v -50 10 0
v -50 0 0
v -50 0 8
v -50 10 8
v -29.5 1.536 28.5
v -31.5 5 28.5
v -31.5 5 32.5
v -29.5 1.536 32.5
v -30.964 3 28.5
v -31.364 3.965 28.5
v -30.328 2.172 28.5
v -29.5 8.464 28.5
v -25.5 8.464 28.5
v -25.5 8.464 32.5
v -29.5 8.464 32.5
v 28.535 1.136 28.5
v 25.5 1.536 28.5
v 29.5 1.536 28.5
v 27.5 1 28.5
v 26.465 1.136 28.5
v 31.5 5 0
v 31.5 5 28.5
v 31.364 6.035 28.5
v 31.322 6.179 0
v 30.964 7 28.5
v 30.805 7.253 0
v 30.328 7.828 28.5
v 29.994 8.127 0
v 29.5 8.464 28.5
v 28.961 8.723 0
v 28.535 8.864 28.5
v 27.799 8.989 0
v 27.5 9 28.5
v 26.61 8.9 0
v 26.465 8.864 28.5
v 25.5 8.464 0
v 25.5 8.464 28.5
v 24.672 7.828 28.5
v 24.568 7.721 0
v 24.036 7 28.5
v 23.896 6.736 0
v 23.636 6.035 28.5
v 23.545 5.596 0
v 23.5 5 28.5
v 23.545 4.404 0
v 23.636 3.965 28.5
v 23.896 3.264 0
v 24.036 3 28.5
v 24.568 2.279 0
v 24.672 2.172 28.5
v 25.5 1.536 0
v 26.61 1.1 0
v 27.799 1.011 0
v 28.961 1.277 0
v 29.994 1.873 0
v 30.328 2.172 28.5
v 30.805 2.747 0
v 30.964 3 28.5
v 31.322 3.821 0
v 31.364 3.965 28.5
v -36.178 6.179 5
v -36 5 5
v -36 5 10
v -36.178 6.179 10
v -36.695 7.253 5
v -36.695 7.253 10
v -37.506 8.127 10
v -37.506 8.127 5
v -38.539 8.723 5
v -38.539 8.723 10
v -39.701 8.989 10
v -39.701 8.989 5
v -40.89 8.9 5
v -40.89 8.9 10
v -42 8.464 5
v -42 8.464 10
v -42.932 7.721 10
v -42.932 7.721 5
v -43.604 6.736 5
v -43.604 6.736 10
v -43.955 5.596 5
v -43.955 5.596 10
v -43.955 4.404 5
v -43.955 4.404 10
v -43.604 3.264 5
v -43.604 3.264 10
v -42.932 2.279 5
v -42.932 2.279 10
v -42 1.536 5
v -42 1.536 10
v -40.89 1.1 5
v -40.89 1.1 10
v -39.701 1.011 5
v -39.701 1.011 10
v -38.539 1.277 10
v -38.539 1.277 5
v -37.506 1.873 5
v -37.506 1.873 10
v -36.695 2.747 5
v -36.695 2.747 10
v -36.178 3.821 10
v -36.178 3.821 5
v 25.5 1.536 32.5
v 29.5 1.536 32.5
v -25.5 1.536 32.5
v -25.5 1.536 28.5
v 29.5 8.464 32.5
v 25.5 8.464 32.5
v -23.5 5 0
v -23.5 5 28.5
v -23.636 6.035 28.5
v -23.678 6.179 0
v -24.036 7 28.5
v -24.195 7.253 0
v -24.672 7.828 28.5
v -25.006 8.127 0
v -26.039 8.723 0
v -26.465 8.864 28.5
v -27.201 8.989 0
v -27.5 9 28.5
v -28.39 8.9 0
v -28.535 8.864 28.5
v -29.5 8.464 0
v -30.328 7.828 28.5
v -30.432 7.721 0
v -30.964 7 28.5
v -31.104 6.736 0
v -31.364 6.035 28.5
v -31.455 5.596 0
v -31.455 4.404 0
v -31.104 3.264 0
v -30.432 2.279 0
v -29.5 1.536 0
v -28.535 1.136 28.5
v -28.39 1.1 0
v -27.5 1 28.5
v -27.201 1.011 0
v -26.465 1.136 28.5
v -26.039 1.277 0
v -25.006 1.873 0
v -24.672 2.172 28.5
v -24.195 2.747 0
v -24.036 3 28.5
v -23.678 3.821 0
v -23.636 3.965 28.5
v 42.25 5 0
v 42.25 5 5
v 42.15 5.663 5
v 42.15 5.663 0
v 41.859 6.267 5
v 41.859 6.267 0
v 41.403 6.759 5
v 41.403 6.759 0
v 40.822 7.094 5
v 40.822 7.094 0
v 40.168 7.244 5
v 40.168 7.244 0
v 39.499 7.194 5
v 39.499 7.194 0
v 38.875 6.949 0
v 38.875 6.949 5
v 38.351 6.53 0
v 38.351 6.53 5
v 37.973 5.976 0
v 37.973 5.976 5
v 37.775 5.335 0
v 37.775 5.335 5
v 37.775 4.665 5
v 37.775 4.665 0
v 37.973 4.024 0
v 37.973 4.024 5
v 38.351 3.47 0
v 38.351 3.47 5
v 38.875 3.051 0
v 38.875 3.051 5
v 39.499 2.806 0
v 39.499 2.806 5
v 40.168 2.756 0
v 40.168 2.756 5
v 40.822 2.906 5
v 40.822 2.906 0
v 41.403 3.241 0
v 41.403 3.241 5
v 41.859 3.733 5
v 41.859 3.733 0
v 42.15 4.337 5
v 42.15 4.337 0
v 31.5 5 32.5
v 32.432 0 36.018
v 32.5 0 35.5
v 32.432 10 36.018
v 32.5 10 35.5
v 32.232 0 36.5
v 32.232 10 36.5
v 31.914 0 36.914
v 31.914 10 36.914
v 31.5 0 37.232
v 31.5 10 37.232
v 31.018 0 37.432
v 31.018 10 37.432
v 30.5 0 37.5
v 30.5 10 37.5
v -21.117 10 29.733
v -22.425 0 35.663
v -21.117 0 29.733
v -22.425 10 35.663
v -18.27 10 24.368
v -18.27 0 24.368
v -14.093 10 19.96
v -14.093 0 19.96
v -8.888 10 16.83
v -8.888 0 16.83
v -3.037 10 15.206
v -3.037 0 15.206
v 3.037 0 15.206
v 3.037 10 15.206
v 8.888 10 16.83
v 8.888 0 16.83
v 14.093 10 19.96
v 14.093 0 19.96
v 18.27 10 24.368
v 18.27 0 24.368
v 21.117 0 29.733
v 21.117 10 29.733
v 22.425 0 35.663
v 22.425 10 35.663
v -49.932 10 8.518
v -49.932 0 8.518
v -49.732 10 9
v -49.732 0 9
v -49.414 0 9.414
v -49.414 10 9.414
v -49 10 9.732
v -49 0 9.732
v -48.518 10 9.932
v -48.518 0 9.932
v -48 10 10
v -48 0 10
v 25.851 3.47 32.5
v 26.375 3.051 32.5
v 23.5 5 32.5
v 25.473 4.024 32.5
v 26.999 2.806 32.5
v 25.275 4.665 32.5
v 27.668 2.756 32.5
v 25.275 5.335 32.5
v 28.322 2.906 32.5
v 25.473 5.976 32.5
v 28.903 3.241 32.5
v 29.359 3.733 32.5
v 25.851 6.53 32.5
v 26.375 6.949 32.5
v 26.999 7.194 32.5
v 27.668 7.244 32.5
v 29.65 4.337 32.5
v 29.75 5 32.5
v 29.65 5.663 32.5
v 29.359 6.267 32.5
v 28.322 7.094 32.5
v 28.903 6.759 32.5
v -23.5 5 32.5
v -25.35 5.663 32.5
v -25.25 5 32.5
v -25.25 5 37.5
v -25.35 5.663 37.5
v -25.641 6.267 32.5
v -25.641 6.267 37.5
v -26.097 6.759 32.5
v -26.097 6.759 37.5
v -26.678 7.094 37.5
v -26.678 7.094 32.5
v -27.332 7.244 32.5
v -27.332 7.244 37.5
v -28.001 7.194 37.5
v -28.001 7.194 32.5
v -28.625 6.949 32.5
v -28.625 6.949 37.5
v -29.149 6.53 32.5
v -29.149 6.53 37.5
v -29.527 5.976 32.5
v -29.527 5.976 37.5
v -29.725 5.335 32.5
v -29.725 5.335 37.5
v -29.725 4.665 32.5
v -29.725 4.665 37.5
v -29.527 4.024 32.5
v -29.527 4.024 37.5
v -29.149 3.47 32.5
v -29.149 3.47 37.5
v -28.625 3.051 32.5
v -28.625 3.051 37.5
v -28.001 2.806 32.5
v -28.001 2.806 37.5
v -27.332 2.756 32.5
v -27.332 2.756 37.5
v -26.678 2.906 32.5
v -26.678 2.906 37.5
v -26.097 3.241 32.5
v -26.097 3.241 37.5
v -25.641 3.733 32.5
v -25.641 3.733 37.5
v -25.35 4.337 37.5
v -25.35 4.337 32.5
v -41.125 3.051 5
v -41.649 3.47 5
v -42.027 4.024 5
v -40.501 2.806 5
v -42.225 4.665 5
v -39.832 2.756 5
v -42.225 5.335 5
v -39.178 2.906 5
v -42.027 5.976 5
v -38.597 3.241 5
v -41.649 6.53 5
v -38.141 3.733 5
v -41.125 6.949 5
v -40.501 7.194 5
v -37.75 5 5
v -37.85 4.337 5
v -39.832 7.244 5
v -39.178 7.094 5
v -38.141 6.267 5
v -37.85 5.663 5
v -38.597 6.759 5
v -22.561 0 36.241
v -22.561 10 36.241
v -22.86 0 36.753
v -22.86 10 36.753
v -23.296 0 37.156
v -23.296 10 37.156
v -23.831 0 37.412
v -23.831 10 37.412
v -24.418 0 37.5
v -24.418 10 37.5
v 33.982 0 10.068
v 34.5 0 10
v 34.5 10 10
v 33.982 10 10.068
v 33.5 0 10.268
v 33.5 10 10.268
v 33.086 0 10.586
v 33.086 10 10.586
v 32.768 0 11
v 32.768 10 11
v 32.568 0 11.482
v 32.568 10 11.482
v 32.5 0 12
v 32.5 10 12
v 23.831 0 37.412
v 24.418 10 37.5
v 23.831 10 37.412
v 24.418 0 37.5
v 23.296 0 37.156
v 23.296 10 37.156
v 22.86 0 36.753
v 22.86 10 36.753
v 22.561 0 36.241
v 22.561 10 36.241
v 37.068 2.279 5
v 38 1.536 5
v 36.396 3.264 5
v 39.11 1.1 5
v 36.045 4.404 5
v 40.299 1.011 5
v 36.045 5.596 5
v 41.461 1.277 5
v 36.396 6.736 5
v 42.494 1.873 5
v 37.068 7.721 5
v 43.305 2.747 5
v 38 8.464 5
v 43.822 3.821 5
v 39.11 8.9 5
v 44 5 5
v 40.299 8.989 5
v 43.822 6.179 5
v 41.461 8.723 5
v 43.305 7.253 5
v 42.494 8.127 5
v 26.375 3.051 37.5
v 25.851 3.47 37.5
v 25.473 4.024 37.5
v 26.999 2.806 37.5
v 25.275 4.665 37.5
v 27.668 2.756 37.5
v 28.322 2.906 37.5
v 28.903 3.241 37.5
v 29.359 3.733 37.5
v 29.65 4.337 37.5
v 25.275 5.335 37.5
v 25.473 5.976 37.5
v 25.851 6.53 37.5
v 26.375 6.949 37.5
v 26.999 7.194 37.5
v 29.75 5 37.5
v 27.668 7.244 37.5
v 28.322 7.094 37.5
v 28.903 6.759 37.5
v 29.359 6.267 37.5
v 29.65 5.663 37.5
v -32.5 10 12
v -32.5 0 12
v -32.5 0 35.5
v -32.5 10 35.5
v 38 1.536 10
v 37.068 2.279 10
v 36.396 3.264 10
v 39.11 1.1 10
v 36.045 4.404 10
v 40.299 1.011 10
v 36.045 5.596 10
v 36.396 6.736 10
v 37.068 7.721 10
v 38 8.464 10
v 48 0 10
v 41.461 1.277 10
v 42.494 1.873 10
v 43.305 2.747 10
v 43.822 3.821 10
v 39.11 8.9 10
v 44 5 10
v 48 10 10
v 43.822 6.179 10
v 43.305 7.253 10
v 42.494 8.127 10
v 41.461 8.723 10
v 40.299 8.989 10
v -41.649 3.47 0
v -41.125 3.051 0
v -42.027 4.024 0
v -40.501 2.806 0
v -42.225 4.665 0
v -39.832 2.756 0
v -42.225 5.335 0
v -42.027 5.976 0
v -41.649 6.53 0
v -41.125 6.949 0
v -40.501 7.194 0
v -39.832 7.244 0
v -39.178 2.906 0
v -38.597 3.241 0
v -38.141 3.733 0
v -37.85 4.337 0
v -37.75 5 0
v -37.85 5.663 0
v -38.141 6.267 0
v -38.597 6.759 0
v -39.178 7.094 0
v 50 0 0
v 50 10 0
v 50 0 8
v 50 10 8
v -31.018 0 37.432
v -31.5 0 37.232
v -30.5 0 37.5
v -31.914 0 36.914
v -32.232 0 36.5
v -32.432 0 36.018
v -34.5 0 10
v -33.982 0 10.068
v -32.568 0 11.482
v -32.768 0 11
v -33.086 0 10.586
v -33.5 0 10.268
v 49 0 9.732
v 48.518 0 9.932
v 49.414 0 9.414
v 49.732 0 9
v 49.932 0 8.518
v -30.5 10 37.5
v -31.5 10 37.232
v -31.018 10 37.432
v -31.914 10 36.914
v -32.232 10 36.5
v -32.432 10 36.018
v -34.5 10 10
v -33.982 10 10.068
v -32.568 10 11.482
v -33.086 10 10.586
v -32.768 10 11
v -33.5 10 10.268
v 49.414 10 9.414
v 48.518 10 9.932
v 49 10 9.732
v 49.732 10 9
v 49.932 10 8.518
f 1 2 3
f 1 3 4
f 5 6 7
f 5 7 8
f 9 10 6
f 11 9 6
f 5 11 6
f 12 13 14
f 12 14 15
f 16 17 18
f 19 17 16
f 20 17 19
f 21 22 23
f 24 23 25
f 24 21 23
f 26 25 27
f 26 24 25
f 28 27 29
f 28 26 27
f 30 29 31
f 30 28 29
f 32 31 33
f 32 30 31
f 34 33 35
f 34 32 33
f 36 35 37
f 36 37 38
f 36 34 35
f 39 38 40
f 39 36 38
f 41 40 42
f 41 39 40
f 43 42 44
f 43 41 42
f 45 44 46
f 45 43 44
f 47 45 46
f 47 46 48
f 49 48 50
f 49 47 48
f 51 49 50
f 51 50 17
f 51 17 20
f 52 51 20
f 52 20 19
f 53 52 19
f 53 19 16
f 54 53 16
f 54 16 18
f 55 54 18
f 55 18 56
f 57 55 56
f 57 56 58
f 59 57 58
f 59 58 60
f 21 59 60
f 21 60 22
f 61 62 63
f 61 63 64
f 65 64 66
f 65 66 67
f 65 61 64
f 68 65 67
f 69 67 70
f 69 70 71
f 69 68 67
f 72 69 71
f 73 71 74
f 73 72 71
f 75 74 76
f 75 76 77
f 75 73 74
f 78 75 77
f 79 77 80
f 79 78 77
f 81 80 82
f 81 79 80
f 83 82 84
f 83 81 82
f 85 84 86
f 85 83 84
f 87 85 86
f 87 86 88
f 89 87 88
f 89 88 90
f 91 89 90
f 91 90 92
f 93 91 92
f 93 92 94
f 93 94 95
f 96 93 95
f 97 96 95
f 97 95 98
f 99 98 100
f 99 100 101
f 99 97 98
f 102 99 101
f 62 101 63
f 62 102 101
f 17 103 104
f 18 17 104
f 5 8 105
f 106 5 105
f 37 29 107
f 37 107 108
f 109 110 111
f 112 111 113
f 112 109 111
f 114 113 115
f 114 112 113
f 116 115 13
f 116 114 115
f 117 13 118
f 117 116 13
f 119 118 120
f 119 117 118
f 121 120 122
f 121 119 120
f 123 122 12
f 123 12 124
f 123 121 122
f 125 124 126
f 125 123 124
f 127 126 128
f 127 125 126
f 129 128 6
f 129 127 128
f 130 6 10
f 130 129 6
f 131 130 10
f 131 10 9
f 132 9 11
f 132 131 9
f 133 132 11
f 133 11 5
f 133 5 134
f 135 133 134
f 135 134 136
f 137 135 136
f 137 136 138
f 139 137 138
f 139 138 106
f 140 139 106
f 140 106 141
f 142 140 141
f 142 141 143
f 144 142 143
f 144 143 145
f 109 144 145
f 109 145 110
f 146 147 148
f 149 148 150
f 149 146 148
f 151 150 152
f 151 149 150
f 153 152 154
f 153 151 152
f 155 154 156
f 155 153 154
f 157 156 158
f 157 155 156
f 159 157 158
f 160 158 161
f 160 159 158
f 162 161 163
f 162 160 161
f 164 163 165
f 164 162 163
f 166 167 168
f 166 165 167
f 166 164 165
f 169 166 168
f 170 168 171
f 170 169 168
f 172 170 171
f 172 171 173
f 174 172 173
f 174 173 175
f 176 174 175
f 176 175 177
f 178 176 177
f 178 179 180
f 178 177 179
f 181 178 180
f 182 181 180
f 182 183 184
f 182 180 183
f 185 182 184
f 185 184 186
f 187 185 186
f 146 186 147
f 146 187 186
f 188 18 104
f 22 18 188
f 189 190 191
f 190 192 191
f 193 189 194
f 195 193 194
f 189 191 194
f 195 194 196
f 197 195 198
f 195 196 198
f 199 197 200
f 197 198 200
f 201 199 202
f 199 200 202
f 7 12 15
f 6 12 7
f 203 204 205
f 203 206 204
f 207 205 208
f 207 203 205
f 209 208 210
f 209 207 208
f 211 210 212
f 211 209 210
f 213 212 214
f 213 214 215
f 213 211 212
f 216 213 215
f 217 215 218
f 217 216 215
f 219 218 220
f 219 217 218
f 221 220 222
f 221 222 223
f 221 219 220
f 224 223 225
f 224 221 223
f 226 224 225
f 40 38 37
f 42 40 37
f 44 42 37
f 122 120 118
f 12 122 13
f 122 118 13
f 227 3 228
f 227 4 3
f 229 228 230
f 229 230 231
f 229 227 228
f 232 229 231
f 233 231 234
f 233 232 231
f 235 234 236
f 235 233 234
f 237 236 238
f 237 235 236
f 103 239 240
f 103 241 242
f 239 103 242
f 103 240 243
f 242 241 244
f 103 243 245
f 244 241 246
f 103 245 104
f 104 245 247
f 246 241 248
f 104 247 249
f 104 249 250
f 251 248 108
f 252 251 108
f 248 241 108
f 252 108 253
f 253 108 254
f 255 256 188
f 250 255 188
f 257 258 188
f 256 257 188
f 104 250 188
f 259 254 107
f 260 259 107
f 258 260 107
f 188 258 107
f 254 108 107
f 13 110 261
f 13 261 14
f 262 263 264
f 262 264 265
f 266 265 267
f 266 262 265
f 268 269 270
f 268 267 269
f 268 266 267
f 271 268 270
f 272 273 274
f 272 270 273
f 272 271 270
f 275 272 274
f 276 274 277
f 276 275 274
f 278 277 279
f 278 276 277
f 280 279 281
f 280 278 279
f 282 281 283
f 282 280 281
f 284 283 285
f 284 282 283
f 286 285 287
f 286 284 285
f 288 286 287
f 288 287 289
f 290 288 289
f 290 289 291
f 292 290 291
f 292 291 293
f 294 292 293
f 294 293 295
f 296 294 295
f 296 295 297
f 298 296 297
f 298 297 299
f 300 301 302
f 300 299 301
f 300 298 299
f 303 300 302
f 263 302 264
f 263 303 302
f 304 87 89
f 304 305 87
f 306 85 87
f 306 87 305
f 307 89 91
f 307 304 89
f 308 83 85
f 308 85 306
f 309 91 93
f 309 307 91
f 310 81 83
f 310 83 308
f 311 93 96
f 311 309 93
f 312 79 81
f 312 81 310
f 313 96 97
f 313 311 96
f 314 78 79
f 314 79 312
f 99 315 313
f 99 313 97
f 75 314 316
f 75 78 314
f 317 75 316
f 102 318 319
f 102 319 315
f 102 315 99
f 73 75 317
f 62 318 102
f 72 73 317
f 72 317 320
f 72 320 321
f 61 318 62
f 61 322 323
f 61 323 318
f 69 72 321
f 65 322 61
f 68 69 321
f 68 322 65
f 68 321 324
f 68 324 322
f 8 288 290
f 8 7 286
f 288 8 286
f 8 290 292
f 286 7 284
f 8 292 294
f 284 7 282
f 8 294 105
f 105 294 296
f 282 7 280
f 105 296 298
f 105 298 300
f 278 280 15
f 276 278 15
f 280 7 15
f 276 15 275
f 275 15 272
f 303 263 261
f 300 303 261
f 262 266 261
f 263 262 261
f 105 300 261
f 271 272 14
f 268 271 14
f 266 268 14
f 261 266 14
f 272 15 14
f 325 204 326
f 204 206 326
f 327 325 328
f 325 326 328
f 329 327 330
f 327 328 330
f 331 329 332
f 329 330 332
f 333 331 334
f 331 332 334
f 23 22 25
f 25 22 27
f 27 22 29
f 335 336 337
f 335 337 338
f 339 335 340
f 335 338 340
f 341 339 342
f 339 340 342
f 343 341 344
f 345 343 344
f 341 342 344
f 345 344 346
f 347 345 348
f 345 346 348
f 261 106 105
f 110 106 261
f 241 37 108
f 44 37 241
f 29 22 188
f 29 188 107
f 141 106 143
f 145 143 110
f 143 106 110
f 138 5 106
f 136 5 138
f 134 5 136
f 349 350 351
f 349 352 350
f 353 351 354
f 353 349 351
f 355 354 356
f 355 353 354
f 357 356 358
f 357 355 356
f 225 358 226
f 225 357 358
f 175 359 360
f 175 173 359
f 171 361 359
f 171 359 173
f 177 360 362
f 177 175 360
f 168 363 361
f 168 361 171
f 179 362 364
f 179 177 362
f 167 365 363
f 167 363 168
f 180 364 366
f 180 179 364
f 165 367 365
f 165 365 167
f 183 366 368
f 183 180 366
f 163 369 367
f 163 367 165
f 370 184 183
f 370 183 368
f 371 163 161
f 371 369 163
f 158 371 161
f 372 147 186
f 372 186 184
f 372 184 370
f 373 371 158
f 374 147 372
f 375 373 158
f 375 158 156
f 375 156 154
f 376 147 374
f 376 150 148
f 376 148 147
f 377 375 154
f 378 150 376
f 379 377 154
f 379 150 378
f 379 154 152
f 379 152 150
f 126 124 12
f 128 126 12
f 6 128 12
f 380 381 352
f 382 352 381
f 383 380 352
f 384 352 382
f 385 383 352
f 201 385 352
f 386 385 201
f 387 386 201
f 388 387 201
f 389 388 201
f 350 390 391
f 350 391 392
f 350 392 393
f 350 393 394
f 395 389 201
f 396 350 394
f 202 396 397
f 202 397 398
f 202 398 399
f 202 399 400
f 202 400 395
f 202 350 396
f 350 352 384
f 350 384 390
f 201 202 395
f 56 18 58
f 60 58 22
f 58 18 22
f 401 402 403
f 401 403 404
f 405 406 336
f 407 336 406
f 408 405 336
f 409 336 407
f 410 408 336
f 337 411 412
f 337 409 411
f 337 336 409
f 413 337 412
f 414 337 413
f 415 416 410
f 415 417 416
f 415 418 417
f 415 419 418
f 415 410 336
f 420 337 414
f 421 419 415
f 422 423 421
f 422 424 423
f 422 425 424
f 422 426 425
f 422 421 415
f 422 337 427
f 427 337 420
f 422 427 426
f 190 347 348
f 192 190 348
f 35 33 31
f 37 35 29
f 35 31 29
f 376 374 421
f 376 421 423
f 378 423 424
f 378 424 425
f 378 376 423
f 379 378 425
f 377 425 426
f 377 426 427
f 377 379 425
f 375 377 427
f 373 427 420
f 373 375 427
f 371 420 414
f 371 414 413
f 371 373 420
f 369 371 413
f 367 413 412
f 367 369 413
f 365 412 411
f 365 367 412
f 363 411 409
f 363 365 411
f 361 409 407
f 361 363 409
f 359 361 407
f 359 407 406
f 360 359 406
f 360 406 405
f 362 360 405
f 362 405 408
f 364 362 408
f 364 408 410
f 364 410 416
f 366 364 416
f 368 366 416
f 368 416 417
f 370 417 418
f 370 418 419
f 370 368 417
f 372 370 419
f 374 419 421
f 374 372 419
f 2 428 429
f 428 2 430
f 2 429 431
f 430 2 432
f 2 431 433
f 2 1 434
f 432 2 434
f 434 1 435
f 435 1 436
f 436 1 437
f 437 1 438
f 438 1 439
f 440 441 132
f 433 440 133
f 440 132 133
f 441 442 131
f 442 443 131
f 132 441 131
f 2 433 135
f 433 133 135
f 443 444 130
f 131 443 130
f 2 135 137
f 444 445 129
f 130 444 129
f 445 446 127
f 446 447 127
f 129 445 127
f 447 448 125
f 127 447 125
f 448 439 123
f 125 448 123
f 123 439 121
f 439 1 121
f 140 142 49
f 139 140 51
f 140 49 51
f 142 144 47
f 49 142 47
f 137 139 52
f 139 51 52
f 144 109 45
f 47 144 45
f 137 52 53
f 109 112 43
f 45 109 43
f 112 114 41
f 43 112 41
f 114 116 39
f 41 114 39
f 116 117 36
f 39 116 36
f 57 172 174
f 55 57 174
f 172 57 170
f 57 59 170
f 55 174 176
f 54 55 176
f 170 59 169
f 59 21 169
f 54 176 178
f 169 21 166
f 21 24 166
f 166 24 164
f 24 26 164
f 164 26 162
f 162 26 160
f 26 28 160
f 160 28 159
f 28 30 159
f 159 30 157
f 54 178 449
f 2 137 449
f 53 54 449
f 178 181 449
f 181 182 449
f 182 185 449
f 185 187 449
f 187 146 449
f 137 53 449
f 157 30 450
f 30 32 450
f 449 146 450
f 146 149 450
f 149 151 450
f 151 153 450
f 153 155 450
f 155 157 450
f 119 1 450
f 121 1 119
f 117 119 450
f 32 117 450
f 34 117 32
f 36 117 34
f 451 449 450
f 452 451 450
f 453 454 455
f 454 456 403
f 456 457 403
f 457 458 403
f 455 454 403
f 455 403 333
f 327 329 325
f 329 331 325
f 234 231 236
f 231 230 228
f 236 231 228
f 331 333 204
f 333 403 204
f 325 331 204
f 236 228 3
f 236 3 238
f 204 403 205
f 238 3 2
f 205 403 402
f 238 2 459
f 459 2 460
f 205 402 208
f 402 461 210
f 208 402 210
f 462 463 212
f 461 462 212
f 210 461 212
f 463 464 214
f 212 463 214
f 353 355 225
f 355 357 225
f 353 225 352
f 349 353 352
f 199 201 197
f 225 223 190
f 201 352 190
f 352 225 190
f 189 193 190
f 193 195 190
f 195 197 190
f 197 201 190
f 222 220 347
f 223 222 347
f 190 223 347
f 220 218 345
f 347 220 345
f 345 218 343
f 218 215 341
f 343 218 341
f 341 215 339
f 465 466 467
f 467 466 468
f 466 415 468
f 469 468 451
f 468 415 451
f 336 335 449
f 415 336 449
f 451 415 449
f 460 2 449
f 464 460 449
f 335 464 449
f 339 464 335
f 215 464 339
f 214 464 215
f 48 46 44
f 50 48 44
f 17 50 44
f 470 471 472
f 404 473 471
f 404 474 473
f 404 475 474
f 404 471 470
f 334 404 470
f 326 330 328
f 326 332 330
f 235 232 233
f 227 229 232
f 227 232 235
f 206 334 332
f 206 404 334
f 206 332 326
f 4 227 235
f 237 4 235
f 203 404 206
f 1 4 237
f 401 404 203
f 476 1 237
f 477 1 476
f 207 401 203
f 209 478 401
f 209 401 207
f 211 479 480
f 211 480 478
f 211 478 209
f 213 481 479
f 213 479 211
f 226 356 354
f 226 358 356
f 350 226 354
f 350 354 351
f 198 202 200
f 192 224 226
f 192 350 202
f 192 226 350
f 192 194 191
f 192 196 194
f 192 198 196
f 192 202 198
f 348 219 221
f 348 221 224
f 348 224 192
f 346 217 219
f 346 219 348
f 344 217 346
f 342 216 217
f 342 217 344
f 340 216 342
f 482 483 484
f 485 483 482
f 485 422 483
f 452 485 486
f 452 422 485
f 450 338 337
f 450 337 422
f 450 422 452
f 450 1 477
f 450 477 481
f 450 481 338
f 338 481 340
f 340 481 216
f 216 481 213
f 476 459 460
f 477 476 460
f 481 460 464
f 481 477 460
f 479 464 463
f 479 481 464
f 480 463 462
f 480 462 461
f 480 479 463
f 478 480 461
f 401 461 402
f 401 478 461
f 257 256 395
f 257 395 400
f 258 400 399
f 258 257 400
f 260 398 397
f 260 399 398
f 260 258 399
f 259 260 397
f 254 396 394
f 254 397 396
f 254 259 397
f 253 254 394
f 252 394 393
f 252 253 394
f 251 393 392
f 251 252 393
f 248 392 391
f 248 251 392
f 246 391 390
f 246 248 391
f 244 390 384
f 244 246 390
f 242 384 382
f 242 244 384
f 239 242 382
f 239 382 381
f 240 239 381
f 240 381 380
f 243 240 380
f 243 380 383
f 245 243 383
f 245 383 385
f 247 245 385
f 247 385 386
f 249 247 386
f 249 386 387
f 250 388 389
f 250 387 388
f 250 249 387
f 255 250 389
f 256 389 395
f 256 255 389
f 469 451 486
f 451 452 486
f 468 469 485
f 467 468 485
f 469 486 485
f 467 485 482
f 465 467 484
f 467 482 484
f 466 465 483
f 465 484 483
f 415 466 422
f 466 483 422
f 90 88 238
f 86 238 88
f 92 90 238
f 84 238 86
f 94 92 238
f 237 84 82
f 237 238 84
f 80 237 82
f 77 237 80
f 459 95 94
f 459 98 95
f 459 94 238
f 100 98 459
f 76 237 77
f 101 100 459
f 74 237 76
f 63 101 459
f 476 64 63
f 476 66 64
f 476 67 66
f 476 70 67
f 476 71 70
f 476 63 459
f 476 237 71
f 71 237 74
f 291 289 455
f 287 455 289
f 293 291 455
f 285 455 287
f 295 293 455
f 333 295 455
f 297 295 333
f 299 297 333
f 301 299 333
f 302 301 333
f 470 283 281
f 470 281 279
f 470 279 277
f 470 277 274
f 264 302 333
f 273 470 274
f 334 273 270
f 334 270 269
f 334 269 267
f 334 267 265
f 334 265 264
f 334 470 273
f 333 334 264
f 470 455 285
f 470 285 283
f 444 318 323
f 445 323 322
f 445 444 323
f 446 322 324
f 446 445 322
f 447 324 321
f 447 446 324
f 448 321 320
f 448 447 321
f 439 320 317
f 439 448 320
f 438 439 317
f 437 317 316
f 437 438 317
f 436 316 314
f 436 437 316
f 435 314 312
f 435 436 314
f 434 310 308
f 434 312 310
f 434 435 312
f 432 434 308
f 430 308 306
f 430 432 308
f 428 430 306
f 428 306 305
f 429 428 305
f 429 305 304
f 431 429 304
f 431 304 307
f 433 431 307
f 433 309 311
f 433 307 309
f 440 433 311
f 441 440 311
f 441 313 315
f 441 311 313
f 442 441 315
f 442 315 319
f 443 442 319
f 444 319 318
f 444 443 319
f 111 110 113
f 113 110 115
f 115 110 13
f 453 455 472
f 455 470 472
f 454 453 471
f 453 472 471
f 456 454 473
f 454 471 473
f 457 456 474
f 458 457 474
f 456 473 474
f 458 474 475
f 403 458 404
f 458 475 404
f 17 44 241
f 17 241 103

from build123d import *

# Parameters (mm, degrees)
CYLINDER011_R     = 4
CYLINDER011_DEPTH = 28.5
CYLINDER007_R     = 2.25
CYLINDER007_DEPTH = 65
CYLINDER006_R     = 2.25
CYLINDER006_DEPTH = 65
PAD002_DEPTH      = 4
PAD001_DEPTH      = 4
CYLINDER010_R     = 4
CYLINDER010_DEPTH = 28.5
CYLINDER004_R     = 2.25
CYLINDER004_DEPTH = 10
CYLINDER005_R     = 4
CYLINDER005_DEPTH = 5
CYLINDER002_R     = 2.25
CYLINDER002_DEPTH = 10
CYLINDER003_R     = 4
CYLINDER003_DEPTH = 5
CYLINDER_R        = 22.5
CYLINDER_DEPTH    = 10
BOX_W             = 100
BOX_H             = 10
BOX_DEPTH         = 10
BOX001_W          = 65
BOX001_H          = 10
BOX001_DEPTH      = 37.5
FILLET_R          = 2


with BuildPart() as cylinder011:
    # Cylinder011 → Cylinder011 (new body)
    with BuildSketch(Plane(origin=(-27.5, 5, 0), x_dir=(1, 0, 0), z_dir=(0, 0, 1))):
        Circle(CYLINDER011_R)
    extrude(amount=CYLINDER011_DEPTH)


with BuildPart() as cylinder007:
    # Cylinder007 → Cylinder007 (new body)
    with BuildSketch(Plane(origin=(-27.5, 5, 0), x_dir=(1, 0, 0), z_dir=(0, 0, 1))):
        Circle(CYLINDER007_R)
    extrude(amount=CYLINDER007_DEPTH)


with BuildPart() as fusion004:
    # Cylinder006 → Cylinder006 (new body)
    with BuildSketch(Plane(origin=(27.5, 5, 0), x_dir=(1, 0, 0), z_dir=(0, 0, 1))):
        Circle(CYLINDER006_R)
    extrude(amount=CYLINDER006_DEPTH)

    # Fusion004: union Cylinder007
    add(cylinder007.part)


with BuildPart() as m4press001:
    # Sketch002 → Pad002 (new body)
    with BuildSketch(Plane.XY):
        Polygon((4, 0), (2, 3.464102), (-2, 3.464102), (-4, 0), (-2, -3.464102), (2, -3.464102), align=None)
    extrude(amount=PAD002_DEPTH)


with BuildPart() as m4press001_1:
    # Body002 placement: moved
    add(m4press001.part.moved(Location((27.5, 5, 28.5))))


with BuildPart() as m4press:
    # Sketch001 → Pad001 (new body)
    with BuildSketch(Plane.XY):
        Polygon((4, 0), (2, 3.464102), (-2, 3.464102), (-4, 0), (-2, -3.464102), (2, -3.464102), align=None)
    extrude(amount=PAD001_DEPTH)


with BuildPart() as m4press_1:
    # Body001 placement: moved
    add(m4press.part.moved(Location((-27.5, 5, 28.5))))


with BuildPart() as connectors:
    # Cylinder010 → Cylinder010 (new body)
    with BuildSketch(Plane(origin=(27.5, 5, 0), x_dir=(1, 0, 0), z_dir=(0, 0, 1))):
        Circle(CYLINDER010_R)
    extrude(amount=CYLINDER010_DEPTH)

    # Fusion006: union Cylinder011, Fusion004, M4Press001, M4Press
    add(cylinder011.part)
    add(fusion004.part)
    add(m4press001_1.part)
    add(m4press_1.part)


with BuildPart() as cylinder004:
    # Cylinder004 → Cylinder004 (new body)
    with BuildSketch(Plane.XY):
        Circle(CYLINDER004_R)
    extrude(amount=CYLINDER004_DEPTH)


with BuildPart() as fusion002:
    # Cylinder005 → Cylinder005 (new body)
    with BuildSketch(Plane.XY.offset(5)):
        Circle(CYLINDER005_R)
    extrude(amount=CYLINDER005_DEPTH)

    # Fusion002: union Cylinder004
    add(cylinder004.part)


with BuildPart() as fusion002_1:
    # Fusion002 placement: moved
    add(fusion002.part.moved(Location((-40, 5, 0))))


with BuildPart() as cylinder002:
    # Cylinder002 → Cylinder002 (new body)
    with BuildSketch(Plane.XY):
        Circle(CYLINDER002_R)
    extrude(amount=CYLINDER002_DEPTH)


with BuildPart() as fusion003:
    # Cylinder003 → Cylinder003 (new body)
    with BuildSketch(Plane.XY.offset(5)):
        Circle(CYLINDER003_R)
    extrude(amount=CYLINDER003_DEPTH)

    # Fusion001: union Cylinder002
    add(cylinder002.part)


with BuildPart() as fusion003_1:
    # Fusion001 placement: moved
    add(fusion003.part.moved(Location((40, 5, 0))))

    # Fusion003: union Fusion002
    add(fusion002_1.part)


with BuildPart() as cylinder:
    # Cylinder → Cylinder (new body)
    with BuildSketch(Plane(origin=(0, 10, 37.5), x_dir=(1, 0, 0), z_dir=(0, -1, 0))):
        Circle(CYLINDER_R)
    extrude(amount=CYLINDER_DEPTH)


with BuildPart() as cube:
    # Box → Box (new body)
    with BuildSketch(Plane(origin=(-50, 0, 0), x_dir=(1, 0, 0), z_dir=(0, 0, 1))):
        with Locations((50, 5)):
            Rectangle(BOX_W, BOX_H)
    extrude(amount=BOX_DEPTH)


with BuildPart() as lower_part:
    # Box001 → Box001 (new body)
    with BuildSketch(Plane(origin=(-32.5, 0, 0), x_dir=(1, 0, 0), z_dir=(0, 0, 1))):
        with Locations((32.5, 5)):
            Rectangle(BOX001_W, BOX001_H)
    extrude(amount=BOX001_DEPTH)

    # Fusion: union Cube
    add(cube.part)

    # Cut: cut Cylinder
    add(cylinder.part, mode=Mode.SUBTRACT)

    # Cut001: cut Fusion003
    add(fusion003_1.part, mode=Mode.SUBTRACT)

    # Cut002: cut Connectors
    add(connectors.part, mode=Mode.SUBTRACT)

    # Fillet
    fillet_edges = [lower_part.edges().sort_by_distance(p)[0] for p in [
        (50, 5, 10),
        (32.5, 5, 10),
        (32.5, 5, 37.5),
        (22.5, 5, 37.5),
        (-22.5, 5, 37.5),
        (-32.5, 5, 37.5),
        (-32.5, 5, 10),
        (-50, 5, 10),
    ]]
    fillet(fillet_edges, radius=FILLET_R)


solid = lower_part.part
